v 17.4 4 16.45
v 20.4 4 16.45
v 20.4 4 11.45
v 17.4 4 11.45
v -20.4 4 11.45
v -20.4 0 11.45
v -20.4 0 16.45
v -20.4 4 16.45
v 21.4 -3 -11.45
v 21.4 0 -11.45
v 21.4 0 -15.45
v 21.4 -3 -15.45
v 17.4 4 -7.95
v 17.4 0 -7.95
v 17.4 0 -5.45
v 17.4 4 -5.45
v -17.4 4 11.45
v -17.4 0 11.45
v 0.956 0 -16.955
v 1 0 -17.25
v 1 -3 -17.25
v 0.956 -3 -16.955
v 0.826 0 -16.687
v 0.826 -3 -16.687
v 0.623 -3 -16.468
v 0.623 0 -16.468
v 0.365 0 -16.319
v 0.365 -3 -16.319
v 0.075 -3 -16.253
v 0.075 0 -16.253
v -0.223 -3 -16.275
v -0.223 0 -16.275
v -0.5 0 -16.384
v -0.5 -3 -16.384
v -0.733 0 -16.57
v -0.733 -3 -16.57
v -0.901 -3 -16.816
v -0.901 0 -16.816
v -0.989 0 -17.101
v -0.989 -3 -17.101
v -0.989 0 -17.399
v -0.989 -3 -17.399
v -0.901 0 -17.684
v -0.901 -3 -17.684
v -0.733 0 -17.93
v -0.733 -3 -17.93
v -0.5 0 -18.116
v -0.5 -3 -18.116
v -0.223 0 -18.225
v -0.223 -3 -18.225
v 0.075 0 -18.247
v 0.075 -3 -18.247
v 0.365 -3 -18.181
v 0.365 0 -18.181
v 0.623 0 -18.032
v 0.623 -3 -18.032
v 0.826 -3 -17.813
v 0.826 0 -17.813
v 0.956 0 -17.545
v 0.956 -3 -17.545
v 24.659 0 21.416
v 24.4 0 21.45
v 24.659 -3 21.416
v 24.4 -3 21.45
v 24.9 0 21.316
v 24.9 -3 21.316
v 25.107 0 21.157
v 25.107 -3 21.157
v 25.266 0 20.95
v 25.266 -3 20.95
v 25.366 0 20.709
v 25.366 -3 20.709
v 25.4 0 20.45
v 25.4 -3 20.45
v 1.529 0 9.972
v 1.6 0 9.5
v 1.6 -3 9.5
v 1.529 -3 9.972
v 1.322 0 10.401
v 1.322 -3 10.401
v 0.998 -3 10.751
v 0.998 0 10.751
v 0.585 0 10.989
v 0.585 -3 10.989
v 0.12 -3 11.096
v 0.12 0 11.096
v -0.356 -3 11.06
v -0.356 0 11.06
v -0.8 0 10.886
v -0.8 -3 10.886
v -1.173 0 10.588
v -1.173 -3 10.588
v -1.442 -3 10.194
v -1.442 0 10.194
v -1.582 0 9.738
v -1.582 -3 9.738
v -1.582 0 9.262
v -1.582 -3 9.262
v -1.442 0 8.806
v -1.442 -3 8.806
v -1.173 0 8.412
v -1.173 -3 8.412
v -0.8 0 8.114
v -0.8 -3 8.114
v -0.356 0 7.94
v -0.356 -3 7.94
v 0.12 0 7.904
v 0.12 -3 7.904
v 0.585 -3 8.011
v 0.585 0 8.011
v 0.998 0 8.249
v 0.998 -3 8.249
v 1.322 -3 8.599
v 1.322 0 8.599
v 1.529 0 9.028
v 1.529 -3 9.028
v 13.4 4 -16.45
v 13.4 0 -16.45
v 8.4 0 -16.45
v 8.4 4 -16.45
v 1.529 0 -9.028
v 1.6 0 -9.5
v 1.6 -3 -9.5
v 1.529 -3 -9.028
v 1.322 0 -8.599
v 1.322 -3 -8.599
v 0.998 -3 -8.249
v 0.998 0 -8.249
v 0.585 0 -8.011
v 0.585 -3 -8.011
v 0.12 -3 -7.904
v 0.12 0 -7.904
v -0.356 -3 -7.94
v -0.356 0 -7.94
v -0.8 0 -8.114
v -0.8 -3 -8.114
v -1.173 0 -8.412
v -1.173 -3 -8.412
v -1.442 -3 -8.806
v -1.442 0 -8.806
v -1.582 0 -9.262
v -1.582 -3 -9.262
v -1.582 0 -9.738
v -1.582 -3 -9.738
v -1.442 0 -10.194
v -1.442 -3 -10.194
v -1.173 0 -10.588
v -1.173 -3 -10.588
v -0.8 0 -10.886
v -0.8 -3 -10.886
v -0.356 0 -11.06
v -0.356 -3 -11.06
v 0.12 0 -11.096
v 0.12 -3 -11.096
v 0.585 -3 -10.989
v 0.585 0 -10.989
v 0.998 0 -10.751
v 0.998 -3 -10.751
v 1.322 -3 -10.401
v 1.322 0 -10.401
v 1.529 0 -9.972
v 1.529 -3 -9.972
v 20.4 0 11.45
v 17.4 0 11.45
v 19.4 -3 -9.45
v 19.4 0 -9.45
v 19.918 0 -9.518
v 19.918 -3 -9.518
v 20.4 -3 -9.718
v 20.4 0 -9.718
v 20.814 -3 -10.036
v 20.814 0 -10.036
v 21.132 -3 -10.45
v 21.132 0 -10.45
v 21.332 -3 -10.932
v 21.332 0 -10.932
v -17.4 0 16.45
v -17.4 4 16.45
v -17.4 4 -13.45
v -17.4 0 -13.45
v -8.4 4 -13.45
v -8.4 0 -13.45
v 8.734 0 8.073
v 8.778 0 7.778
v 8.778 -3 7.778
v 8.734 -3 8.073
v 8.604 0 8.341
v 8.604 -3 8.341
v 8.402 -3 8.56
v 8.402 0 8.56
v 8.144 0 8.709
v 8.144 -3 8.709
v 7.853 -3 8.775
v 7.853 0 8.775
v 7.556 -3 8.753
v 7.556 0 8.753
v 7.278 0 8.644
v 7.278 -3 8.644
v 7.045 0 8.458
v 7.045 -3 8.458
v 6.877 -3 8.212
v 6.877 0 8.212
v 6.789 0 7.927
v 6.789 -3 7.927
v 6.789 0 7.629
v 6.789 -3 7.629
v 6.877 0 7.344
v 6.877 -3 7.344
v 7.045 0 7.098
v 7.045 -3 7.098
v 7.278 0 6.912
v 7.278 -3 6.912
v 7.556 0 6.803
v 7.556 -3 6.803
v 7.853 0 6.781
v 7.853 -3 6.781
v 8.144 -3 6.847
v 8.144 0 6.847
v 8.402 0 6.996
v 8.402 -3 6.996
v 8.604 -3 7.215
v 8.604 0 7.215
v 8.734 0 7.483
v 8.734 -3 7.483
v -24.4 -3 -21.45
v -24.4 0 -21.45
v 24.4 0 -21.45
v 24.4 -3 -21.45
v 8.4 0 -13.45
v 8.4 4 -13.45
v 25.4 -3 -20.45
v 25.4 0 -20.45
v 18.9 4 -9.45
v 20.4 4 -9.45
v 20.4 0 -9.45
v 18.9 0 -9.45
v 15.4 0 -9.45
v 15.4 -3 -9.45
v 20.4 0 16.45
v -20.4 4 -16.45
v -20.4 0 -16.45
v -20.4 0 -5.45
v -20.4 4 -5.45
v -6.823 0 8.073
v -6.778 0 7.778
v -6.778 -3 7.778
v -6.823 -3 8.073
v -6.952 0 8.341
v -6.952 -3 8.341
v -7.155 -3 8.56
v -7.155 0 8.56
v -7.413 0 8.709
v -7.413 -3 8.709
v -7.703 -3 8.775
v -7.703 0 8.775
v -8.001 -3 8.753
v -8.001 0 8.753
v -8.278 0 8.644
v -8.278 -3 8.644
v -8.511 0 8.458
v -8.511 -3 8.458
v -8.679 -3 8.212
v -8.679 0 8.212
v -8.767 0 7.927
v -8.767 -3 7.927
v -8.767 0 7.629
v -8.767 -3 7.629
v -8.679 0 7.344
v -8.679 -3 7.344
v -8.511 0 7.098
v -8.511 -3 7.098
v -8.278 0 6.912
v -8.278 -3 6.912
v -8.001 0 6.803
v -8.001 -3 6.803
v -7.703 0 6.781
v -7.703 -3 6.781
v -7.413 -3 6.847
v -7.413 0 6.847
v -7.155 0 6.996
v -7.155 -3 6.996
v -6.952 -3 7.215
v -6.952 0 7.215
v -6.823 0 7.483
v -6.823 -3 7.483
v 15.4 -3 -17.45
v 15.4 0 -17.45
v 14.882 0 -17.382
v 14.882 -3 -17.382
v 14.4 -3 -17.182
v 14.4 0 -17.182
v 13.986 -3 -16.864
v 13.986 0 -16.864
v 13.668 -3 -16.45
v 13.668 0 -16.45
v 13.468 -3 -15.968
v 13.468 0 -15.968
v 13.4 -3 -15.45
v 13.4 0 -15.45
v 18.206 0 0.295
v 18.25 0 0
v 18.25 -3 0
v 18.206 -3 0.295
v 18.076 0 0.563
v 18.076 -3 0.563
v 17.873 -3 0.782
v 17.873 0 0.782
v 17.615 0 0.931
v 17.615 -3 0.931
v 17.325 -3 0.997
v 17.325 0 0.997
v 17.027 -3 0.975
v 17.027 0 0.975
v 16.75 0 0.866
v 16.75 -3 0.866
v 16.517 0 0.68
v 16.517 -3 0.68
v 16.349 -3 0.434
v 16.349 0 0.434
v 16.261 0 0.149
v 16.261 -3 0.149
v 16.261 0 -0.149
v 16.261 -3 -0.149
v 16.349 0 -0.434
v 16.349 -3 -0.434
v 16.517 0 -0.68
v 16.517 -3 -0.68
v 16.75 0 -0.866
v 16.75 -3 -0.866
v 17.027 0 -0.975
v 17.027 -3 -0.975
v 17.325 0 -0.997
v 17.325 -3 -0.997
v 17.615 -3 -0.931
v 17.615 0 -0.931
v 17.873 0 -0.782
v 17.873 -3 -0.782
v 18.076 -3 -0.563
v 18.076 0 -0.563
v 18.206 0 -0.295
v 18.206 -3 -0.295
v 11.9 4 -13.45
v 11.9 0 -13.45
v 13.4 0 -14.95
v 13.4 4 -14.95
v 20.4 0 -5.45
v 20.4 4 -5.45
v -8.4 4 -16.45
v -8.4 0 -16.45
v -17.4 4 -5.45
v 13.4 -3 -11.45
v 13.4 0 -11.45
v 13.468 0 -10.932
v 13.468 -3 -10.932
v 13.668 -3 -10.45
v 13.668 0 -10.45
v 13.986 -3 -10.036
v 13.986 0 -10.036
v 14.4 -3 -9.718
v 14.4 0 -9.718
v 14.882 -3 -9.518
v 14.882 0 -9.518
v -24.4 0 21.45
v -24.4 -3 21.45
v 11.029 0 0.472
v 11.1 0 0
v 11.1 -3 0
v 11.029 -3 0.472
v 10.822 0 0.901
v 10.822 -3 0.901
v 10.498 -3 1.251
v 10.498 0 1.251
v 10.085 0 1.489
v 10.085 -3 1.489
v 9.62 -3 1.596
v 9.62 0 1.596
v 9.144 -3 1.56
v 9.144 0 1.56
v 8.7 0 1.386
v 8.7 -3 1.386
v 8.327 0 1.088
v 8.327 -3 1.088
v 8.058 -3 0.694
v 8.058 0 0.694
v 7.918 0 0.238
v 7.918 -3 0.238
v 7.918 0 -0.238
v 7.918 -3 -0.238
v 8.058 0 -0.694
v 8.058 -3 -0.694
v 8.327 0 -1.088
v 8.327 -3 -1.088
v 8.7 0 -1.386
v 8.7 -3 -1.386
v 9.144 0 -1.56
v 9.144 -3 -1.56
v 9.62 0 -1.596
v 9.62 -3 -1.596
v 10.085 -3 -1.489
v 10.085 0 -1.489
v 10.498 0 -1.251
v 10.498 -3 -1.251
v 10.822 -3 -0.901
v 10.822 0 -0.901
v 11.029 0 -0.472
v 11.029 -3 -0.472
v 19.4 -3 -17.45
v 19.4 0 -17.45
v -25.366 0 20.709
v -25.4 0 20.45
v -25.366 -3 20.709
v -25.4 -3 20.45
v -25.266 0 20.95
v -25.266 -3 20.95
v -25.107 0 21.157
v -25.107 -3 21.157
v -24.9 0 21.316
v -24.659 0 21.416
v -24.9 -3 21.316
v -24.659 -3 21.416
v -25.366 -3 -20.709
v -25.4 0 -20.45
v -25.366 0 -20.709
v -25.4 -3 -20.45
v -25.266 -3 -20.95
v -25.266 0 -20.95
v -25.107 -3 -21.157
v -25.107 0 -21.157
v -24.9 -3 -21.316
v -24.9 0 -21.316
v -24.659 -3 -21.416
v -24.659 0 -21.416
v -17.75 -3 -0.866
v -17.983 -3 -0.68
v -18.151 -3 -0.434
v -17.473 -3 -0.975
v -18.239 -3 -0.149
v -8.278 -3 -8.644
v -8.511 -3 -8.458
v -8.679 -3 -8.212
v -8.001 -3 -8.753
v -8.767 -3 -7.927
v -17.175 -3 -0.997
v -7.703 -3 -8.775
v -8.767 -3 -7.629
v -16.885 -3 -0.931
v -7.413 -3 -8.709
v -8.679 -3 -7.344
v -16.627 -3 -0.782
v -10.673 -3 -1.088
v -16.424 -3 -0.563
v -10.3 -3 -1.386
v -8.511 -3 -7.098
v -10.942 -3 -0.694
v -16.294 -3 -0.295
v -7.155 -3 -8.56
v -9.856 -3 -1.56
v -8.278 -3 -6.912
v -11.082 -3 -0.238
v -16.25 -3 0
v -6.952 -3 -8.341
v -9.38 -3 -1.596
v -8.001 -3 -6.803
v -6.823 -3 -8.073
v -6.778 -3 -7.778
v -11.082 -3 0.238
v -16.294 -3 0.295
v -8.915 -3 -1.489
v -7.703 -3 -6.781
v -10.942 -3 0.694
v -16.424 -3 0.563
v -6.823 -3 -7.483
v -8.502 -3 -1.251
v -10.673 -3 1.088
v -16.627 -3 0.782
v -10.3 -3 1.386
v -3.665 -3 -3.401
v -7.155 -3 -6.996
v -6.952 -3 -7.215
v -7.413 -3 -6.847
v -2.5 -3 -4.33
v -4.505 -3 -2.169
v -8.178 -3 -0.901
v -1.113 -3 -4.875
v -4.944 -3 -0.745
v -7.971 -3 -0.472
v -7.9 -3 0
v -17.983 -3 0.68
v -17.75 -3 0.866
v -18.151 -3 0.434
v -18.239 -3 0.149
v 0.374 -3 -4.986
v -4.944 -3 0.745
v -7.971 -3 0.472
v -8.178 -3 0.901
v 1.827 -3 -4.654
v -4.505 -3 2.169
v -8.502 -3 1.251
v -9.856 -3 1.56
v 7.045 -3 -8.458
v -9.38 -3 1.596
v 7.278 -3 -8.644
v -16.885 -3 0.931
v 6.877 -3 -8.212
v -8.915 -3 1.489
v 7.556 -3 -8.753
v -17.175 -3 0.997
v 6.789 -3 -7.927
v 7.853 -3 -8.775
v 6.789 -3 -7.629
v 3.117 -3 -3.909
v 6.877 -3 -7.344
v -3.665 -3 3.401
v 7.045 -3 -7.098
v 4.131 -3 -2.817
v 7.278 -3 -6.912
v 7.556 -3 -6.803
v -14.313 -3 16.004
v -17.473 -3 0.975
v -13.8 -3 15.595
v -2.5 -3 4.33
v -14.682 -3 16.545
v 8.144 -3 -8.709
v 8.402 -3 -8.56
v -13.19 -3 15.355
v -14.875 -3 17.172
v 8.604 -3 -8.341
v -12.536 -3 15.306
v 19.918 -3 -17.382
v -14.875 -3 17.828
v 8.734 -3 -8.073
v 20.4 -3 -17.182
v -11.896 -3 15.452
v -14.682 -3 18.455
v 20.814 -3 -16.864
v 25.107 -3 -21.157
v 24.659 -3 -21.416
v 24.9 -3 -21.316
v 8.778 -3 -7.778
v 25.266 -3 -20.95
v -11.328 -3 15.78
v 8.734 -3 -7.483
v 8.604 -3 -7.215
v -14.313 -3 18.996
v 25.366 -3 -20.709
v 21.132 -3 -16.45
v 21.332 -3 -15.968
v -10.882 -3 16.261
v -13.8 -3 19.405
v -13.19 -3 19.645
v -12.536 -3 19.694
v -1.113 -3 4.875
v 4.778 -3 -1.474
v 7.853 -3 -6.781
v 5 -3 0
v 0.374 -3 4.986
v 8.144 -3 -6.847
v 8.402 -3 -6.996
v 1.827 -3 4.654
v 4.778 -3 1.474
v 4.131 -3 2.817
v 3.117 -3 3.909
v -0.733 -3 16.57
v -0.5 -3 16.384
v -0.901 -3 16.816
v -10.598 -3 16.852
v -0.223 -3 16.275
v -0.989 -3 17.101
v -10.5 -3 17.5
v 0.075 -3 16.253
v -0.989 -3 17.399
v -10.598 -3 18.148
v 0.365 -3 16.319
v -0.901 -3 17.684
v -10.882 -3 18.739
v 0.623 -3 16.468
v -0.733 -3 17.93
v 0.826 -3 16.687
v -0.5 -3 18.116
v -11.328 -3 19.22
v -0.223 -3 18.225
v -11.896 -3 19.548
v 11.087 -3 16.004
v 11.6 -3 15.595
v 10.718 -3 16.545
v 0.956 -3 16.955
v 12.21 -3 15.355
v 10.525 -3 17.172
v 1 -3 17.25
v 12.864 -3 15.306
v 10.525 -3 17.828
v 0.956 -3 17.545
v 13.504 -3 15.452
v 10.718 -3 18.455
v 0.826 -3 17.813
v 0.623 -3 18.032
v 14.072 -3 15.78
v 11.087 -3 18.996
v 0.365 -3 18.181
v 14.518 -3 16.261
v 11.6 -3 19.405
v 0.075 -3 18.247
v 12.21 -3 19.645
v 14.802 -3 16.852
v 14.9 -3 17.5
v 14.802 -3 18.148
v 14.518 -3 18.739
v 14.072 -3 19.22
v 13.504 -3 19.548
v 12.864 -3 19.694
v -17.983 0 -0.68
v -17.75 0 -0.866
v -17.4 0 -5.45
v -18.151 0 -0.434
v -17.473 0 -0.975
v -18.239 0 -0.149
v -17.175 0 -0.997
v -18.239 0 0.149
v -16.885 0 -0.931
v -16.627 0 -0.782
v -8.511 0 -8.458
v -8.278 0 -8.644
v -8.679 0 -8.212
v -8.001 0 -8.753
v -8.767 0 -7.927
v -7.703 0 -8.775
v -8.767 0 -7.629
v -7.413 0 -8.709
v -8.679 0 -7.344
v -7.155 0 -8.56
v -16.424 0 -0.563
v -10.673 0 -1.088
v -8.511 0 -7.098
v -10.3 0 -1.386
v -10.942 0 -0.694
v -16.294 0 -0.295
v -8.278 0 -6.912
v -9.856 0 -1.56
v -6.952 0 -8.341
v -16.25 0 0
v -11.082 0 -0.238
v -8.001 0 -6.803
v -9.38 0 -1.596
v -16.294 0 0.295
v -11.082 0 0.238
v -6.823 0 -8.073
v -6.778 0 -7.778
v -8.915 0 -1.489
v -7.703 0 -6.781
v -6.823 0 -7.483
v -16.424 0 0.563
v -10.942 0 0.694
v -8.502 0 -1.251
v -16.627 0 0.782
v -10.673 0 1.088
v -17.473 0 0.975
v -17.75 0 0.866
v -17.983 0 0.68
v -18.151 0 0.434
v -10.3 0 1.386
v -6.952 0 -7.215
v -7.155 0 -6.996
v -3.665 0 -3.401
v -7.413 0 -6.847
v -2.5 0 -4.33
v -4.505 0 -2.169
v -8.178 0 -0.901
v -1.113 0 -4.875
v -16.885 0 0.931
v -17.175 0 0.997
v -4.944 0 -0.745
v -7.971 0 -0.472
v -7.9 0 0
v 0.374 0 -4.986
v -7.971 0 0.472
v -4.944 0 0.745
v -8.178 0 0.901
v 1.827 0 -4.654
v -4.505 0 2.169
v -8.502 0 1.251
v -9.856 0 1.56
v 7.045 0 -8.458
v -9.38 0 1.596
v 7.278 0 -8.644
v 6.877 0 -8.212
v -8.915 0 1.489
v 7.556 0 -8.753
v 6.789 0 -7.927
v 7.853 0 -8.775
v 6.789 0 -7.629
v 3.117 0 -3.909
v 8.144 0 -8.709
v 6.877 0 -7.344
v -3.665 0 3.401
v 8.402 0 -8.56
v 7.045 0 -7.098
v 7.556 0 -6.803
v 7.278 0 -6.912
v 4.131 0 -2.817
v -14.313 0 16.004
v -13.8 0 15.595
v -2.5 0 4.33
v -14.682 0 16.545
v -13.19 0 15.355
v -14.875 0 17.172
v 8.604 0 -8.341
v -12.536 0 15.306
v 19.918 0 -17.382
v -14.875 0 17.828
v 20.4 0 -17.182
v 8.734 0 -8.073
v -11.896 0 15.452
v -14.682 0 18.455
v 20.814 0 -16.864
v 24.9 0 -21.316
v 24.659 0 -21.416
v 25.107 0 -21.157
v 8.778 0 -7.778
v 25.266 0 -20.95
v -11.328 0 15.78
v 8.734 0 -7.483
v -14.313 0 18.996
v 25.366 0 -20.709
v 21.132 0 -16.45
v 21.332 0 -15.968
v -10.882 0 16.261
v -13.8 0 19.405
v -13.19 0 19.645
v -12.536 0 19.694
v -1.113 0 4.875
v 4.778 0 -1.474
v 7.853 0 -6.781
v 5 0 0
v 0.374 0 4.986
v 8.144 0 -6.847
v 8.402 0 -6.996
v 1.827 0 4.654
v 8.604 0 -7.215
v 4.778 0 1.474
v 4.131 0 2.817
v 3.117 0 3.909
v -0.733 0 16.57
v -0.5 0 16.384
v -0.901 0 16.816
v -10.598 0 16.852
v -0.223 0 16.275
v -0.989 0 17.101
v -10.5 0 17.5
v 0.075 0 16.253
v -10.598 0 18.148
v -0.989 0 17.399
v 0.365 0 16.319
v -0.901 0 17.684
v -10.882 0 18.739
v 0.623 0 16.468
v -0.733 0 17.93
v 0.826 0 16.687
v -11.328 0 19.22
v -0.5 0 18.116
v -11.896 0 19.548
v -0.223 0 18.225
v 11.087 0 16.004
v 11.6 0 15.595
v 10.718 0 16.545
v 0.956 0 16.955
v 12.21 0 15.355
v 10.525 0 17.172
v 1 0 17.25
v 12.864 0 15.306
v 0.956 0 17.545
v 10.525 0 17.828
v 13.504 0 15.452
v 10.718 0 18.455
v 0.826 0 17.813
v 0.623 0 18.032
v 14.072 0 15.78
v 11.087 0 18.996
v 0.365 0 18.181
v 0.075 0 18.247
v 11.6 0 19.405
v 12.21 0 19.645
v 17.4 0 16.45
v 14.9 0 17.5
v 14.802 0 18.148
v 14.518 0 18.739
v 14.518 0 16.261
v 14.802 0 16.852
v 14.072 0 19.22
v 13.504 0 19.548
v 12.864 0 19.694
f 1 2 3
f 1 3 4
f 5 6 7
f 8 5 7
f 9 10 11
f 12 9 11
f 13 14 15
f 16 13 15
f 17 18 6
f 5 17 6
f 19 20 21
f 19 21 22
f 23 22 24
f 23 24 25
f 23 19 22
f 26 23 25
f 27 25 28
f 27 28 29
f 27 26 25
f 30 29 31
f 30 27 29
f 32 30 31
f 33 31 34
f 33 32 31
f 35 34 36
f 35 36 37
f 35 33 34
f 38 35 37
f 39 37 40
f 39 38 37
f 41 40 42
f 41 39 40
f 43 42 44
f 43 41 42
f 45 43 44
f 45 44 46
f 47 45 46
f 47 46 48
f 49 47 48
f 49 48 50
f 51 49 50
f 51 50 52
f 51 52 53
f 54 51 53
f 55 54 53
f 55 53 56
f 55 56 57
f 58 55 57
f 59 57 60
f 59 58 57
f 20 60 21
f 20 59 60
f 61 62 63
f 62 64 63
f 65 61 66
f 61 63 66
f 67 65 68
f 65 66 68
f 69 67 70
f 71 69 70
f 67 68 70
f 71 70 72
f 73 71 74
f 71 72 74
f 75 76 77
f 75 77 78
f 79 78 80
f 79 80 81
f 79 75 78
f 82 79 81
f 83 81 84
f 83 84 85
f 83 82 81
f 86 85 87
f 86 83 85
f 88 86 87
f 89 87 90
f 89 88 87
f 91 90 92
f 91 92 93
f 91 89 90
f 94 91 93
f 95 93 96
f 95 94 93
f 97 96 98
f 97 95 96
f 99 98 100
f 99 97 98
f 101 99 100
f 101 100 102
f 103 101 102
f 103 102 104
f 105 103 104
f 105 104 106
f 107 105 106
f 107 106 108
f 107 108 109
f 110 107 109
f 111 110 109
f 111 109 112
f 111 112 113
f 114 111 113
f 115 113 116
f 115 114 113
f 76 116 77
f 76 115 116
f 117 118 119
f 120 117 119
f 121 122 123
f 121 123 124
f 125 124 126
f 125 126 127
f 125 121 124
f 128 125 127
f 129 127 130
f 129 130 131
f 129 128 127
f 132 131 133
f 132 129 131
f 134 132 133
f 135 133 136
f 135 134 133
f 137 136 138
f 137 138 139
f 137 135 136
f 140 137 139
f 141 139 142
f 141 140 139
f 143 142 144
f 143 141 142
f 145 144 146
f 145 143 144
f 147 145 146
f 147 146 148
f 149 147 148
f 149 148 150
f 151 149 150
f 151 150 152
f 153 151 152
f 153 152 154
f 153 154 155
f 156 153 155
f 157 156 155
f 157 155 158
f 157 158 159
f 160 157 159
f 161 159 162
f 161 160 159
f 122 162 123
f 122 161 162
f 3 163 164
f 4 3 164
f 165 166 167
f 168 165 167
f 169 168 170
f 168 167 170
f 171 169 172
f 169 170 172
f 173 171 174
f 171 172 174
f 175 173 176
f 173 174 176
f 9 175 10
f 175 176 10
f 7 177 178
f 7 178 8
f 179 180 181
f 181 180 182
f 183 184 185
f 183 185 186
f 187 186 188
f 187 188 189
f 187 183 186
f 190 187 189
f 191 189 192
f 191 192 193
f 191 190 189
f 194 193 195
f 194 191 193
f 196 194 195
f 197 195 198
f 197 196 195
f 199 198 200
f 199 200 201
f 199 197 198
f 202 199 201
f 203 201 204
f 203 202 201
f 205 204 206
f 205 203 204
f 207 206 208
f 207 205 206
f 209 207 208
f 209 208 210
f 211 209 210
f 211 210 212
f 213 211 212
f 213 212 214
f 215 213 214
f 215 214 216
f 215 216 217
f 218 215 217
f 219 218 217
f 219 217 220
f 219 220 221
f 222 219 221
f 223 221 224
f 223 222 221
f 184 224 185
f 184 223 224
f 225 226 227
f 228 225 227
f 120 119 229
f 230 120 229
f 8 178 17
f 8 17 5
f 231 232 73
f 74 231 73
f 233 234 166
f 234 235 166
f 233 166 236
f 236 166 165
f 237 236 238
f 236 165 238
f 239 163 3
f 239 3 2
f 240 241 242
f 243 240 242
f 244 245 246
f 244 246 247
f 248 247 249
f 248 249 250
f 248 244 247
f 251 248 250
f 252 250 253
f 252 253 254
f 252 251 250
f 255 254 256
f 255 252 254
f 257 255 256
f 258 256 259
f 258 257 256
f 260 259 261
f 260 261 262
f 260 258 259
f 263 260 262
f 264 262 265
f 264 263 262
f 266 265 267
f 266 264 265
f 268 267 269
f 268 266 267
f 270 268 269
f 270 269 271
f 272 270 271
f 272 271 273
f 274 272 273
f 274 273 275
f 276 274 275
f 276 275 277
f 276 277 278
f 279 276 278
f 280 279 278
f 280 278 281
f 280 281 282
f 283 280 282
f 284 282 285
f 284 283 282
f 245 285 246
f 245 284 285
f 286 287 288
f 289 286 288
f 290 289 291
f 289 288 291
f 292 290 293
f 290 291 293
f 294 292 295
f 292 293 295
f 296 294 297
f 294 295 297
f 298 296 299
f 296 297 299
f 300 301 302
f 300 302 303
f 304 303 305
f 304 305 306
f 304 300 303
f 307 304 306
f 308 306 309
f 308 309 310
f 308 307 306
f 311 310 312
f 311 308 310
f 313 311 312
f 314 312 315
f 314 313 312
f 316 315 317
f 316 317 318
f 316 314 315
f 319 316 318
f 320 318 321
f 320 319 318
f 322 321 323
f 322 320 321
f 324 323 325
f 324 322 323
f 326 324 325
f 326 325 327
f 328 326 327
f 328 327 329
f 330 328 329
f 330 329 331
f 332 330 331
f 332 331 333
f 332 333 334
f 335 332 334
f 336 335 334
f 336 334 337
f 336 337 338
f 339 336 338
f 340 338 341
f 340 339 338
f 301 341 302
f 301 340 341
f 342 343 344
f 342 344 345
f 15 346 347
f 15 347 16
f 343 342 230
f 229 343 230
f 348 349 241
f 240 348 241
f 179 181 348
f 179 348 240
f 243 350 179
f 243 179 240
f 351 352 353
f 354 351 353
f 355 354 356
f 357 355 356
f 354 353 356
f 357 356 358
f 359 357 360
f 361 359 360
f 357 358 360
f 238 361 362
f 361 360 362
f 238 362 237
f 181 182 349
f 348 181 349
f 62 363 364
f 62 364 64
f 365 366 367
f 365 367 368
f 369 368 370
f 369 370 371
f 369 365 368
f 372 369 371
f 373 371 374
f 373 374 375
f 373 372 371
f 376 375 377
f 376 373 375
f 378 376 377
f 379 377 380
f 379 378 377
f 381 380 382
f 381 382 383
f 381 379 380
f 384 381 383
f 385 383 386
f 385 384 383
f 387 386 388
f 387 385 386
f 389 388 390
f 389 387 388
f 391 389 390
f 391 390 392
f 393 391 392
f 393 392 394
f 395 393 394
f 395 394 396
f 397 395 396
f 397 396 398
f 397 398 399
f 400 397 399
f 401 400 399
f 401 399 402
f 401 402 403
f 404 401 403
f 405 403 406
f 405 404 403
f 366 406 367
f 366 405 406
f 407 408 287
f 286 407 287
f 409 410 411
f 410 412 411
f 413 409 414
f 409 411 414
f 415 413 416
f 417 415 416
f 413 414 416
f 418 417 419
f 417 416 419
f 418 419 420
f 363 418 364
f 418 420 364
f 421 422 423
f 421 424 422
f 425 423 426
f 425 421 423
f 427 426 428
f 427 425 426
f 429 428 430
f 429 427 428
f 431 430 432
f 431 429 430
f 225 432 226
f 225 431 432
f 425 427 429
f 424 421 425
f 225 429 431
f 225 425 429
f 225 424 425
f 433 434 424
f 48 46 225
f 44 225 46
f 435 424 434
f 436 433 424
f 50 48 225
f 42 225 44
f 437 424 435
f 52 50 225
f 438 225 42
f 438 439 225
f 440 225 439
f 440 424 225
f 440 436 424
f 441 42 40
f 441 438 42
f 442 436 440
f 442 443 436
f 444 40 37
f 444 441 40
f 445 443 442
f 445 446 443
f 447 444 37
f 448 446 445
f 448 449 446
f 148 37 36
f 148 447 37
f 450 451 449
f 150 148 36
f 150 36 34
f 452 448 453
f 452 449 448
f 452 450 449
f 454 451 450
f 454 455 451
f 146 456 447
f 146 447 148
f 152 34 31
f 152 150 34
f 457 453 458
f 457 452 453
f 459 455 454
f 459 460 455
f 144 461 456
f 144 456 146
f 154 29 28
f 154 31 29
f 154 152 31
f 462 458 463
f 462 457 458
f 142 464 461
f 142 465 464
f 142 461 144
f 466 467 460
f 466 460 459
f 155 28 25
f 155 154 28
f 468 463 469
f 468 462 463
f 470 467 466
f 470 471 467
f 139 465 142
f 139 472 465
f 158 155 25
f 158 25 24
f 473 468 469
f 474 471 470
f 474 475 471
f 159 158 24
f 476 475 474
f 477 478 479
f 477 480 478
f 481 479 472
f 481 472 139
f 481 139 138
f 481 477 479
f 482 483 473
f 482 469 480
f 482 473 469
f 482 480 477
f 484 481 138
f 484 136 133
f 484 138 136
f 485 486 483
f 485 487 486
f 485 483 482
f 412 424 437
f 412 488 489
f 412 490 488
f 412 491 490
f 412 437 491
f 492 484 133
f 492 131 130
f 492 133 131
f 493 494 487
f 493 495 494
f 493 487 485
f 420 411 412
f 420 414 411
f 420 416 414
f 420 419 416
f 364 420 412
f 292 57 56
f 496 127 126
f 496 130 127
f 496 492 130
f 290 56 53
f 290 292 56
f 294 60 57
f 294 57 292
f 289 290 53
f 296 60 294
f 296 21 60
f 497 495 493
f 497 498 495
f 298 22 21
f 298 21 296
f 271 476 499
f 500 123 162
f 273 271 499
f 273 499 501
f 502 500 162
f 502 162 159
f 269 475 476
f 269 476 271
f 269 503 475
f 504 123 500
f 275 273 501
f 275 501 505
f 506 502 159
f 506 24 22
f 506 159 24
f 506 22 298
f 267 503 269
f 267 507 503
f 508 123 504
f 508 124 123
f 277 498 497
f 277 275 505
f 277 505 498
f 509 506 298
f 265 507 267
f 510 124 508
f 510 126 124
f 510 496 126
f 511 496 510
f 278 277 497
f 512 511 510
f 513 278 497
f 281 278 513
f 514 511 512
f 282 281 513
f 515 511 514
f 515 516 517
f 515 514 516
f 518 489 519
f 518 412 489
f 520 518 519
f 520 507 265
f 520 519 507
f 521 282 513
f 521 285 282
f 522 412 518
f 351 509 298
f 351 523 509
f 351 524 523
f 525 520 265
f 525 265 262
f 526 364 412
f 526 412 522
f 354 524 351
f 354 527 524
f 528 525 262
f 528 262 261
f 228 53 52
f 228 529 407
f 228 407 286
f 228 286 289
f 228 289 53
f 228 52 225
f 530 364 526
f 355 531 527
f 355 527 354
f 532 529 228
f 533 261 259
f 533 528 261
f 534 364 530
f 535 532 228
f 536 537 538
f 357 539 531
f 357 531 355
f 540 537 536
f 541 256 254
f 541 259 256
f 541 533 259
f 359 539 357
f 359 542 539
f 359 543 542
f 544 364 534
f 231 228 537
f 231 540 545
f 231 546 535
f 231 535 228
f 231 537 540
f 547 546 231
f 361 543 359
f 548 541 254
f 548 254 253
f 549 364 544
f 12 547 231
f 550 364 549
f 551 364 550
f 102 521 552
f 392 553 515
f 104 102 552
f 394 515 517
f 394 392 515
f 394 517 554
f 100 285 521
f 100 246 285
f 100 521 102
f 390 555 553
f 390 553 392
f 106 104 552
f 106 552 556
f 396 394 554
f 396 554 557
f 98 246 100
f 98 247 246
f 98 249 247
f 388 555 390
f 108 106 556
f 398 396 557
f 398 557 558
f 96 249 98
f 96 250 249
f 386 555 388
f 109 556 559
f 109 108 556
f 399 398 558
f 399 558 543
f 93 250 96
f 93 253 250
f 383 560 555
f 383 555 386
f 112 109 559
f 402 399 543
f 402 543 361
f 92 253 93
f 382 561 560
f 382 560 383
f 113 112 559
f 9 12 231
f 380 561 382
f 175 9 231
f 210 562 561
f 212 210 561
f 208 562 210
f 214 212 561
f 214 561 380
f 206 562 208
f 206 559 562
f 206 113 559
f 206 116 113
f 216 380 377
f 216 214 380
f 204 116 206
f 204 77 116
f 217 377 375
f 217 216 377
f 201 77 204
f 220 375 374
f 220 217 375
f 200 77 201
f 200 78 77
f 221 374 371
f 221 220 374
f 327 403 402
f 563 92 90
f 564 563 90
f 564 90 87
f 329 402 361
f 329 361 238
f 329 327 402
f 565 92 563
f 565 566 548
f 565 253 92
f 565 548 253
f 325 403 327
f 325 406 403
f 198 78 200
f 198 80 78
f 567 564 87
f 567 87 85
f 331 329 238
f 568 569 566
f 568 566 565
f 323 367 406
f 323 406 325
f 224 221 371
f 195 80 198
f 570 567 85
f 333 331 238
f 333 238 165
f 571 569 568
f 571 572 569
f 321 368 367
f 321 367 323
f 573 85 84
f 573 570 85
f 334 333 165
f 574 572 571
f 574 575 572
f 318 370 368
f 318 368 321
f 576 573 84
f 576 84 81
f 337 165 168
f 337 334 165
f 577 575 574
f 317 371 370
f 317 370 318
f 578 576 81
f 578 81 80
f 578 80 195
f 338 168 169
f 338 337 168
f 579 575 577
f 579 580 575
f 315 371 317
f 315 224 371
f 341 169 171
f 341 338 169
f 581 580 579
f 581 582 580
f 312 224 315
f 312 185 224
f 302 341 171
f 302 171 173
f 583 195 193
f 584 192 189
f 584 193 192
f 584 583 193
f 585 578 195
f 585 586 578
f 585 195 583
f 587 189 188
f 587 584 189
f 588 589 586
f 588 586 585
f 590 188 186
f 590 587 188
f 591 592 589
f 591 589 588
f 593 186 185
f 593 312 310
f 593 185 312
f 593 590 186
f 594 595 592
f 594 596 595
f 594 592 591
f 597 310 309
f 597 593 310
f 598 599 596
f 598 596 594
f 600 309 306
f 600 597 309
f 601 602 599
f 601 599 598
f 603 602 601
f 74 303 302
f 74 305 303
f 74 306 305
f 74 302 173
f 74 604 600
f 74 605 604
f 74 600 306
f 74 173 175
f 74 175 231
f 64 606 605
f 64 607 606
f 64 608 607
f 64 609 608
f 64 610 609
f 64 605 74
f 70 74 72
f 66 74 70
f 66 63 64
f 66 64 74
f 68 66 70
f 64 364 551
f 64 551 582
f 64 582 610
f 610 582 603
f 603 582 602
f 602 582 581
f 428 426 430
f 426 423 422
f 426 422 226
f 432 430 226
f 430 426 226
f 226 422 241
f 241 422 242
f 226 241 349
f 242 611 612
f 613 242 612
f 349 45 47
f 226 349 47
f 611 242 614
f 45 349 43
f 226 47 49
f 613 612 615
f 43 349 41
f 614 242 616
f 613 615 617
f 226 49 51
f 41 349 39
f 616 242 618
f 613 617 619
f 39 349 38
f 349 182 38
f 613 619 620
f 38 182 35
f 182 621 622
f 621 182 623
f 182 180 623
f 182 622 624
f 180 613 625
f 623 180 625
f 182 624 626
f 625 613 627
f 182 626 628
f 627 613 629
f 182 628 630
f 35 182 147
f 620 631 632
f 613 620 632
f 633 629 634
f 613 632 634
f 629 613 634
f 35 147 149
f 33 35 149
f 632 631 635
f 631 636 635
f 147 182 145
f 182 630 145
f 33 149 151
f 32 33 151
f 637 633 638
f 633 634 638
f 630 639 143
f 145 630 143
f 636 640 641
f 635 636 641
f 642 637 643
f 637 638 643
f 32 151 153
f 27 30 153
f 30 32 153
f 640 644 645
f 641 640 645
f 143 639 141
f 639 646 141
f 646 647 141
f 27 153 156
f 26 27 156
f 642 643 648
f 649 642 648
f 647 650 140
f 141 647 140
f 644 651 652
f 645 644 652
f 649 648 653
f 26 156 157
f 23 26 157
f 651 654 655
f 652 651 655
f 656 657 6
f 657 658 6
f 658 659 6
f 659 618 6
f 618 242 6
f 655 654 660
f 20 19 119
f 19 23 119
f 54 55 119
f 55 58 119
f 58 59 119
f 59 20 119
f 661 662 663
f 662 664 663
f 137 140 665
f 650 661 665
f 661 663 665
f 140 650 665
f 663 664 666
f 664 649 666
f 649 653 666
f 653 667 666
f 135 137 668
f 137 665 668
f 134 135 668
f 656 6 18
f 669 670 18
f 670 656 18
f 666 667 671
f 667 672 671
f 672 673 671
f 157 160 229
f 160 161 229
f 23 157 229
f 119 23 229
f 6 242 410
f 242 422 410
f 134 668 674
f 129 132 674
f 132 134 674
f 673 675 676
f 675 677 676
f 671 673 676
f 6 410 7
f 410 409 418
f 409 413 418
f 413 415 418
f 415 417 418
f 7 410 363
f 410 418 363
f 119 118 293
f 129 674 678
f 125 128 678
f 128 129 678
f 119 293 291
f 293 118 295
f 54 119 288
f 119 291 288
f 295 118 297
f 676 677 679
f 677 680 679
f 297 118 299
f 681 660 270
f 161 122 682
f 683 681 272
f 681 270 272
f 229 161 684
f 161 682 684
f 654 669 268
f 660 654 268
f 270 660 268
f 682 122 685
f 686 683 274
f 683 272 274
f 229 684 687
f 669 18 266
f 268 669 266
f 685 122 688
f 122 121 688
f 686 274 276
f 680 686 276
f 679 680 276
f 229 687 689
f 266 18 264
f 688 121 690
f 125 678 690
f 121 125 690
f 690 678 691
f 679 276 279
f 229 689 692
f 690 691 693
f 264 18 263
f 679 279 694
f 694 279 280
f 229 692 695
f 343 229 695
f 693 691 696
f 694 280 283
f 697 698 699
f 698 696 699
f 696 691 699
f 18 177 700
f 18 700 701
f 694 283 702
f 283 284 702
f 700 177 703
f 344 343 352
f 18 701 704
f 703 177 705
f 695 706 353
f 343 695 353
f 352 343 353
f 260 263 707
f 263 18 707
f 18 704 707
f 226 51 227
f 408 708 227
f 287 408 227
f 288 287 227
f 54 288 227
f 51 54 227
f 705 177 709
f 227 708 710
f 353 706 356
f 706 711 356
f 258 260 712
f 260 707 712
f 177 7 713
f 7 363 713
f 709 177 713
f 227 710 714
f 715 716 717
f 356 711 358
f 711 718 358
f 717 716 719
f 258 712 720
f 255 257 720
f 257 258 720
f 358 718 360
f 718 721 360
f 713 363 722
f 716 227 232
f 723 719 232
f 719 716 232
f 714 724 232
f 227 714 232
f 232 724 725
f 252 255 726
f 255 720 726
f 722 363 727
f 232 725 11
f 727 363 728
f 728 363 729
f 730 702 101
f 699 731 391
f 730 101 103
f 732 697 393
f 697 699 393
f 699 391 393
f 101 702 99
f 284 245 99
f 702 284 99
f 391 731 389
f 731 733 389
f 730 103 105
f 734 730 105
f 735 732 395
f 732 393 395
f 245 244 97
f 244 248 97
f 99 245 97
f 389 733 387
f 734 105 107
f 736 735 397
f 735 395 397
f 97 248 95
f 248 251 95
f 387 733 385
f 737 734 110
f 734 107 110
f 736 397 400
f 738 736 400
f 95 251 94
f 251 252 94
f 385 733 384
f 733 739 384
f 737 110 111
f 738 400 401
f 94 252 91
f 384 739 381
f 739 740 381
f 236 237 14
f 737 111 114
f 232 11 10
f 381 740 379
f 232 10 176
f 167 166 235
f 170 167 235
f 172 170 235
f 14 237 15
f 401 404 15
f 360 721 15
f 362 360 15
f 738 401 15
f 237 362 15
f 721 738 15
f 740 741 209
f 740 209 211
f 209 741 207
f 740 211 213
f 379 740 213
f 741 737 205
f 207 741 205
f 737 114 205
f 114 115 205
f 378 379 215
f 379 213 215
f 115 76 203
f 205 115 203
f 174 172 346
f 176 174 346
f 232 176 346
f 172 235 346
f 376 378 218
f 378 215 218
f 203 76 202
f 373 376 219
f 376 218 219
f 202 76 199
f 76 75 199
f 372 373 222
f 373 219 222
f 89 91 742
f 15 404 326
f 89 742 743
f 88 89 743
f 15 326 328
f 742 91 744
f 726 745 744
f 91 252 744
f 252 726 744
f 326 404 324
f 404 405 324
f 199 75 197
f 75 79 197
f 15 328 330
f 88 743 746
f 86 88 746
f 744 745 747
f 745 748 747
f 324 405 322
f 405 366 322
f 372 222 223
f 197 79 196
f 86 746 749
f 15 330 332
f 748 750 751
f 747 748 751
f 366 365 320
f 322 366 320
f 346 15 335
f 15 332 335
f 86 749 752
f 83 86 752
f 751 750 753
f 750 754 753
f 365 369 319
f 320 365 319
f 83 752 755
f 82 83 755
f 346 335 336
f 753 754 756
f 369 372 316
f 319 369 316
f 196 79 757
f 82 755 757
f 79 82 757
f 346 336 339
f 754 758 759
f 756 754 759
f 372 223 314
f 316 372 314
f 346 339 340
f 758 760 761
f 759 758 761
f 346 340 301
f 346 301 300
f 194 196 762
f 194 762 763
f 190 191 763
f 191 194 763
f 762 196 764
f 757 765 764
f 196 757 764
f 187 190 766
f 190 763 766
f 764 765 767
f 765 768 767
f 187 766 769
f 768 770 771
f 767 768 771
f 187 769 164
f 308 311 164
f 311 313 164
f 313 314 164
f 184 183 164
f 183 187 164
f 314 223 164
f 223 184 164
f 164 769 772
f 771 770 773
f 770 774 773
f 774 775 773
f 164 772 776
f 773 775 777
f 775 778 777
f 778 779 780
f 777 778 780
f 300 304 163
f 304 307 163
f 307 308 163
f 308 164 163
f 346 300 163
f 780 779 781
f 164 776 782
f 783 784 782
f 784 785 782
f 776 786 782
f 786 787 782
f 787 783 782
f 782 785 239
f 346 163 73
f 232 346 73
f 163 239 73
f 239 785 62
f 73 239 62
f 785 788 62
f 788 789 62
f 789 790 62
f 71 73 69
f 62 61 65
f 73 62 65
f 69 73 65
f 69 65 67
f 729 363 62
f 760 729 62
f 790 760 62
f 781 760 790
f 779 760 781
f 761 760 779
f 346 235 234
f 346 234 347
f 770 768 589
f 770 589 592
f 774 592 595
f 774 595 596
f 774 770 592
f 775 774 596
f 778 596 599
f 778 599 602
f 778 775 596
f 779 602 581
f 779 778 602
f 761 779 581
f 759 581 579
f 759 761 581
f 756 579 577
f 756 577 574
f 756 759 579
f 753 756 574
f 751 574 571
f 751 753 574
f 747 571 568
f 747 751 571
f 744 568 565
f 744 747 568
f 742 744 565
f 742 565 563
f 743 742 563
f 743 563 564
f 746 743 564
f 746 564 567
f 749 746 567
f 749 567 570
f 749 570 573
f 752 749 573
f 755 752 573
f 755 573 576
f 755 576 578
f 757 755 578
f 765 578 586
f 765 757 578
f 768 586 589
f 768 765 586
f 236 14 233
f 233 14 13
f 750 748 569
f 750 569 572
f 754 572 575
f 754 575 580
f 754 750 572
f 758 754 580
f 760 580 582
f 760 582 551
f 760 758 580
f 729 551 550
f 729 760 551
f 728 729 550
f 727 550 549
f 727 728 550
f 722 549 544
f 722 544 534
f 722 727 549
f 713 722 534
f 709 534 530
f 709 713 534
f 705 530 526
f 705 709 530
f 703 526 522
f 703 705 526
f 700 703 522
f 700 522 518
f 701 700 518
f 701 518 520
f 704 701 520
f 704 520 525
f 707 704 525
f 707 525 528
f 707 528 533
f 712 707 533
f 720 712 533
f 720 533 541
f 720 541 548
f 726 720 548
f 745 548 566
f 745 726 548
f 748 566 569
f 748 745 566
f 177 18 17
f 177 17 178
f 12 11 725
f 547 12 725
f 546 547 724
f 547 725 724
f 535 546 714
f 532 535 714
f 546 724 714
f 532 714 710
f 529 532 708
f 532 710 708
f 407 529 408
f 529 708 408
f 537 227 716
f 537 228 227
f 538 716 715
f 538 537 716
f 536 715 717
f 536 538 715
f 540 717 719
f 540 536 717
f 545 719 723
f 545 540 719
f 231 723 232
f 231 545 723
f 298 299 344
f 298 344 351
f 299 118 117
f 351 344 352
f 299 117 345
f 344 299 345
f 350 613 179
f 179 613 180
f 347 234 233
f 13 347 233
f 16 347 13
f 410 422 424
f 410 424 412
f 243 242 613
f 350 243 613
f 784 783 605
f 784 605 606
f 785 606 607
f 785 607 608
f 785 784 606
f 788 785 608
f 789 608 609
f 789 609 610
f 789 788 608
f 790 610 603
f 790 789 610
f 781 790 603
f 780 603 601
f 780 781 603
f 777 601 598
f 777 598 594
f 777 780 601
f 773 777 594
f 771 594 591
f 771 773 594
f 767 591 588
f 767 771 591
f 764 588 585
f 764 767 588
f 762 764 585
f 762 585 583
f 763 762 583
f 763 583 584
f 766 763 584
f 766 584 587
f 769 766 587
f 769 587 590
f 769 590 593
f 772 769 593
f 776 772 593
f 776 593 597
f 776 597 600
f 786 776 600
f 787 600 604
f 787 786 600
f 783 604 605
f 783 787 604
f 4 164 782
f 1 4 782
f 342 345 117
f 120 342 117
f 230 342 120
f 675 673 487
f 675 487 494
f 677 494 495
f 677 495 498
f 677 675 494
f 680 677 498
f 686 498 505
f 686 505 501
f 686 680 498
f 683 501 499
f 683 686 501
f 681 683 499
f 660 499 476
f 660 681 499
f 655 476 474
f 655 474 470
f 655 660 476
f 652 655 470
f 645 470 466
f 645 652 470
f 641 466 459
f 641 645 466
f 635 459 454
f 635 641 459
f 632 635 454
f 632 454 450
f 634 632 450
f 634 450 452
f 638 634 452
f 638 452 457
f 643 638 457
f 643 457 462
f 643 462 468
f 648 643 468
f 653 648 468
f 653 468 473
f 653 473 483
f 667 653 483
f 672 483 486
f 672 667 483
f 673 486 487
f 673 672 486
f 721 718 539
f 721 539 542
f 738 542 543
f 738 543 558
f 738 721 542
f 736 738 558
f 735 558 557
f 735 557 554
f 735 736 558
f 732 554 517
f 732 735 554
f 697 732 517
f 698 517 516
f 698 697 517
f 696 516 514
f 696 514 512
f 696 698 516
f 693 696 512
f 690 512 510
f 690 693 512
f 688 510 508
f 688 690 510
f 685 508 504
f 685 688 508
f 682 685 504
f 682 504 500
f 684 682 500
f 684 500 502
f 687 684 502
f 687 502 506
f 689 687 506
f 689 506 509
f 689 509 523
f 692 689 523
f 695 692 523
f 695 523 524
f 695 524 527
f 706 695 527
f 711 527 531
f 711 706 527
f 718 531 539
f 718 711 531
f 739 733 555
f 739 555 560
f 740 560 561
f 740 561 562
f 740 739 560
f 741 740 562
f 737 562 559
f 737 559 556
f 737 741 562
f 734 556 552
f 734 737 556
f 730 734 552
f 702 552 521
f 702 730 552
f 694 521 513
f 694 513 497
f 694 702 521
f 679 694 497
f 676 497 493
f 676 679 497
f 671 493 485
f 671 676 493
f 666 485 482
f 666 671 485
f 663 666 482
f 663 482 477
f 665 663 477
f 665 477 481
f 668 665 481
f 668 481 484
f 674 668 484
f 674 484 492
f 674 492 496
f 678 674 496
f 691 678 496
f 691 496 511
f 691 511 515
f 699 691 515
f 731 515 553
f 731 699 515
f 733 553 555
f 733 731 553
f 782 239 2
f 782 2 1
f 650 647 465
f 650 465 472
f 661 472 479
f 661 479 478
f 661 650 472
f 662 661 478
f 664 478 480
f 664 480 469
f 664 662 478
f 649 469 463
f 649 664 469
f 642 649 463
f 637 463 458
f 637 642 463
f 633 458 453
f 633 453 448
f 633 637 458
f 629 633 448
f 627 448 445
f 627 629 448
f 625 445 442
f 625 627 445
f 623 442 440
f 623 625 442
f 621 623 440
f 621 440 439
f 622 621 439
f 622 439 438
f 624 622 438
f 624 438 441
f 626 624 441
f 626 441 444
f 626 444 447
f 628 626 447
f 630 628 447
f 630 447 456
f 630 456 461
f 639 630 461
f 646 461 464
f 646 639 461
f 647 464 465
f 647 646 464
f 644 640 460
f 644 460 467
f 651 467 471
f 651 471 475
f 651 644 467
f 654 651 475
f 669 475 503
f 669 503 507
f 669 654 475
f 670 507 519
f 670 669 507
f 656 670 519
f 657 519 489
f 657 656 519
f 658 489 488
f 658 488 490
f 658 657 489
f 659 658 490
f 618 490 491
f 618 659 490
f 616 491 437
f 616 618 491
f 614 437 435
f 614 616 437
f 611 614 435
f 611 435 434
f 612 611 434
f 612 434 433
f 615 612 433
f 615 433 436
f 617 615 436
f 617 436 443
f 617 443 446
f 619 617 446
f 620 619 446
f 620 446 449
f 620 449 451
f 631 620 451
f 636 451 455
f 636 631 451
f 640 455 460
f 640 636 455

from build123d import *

# Parameters (mm, degrees)
F0_W     = 50.8
F0_H     = 42.9
F0_R     = 1
F0_R_2   = 1.6
F0_R_3   = 5
F0_R_4   = 2.2
F1_DEPTH = 3
F2_R     = 1
F3_W     = 3
F3_H     = 5
F3_H_2   = 4
F3_W_2   = 5
F3_H_3   = 3
F4_DEPTH = 4
F5_SIZE  = 1.5


with BuildPart() as f1:
    # F0 (on Front) → F1 (new body)
    with BuildSketch(Plane.XZ):
        Rectangle(F0_W, F0_H)
        with Locations((0, -17.25)):
            Circle(F0_R, mode=Mode.SUBTRACT)
        with Locations((-7.7781745931, -7.7781745931)):
            Circle(F0_R, mode=Mode.SUBTRACT)
        with Locations((0, -9.5)):
            Circle(F0_R_2, mode=Mode.SUBTRACT)
        with BuildLine():
            ThreePointArc((21.4, -15.45), (20.8142135624, -16.8642135624), (19.4, -17.45))
            Line((19.4, -17.45), (15.4, -17.45))
            ThreePointArc((15.4, -17.45), (13.9857864376, -16.8642135624), (13.4, -15.45))
            Line((13.4, -15.45), (13.4, -11.45))
            ThreePointArc((13.4, -11.45), (13.9857864376, -10.0357864376), (15.4, -9.45))
            Line((15.4, -9.45), (19.4, -9.45))
            ThreePointArc((19.4, -9.45), (20.8142135624, -10.0357864376), (21.4, -11.45))
            Line((21.4, -11.45), (21.4, -15.45))
        make_face(mode=Mode.SUBTRACT)
        with Locations((7.7781745931, -7.7781745931)):
            Circle(F0_R, mode=Mode.SUBTRACT)
        with Locations((-17.25, 0)):
            Circle(F0_R, mode=Mode.SUBTRACT)
        with Locations((-9.5, 0)):
            Circle(F0_R_2, mode=Mode.SUBTRACT)
        Circle(F0_R_3, mode=Mode.SUBTRACT)
        with Locations((-7.7781745931, 7.7781745931)):
            Circle(F0_R, mode=Mode.SUBTRACT)
        with Locations((0, 9.5)):
            Circle(F0_R_2, mode=Mode.SUBTRACT)
        with Locations((-12.7, 17.5)):
            Circle(F0_R_4, mode=Mode.SUBTRACT)
        with Locations((0, 17.25)):
            Circle(F0_R, mode=Mode.SUBTRACT)
        with Locations((9.5, 0)):
            Circle(F0_R_2, mode=Mode.SUBTRACT)
        with Locations((7.7781745931, 7.7781745931)):
            Circle(F0_R, mode=Mode.SUBTRACT)
        with Locations((17.25, 0)):
            Circle(F0_R, mode=Mode.SUBTRACT)
        with Locations((12.7, 17.5)):
            Circle(F0_R_4, mode=Mode.SUBTRACT)
    extrude(amount=F1_DEPTH)

    # F2
    f2_edges = [f1.edges().sort_by_distance(p)[0] for p in [
        (25.4, -1.5, 21.45),
        (25.4, -1.5, -21.45),
        (-25.4, -1.5, -21.45),
        (-25.4, -1.5, 21.45),
    ]]
    fillet(f2_edges, radius=F2_R)

    # F3 (on face) → F4 (join)
    with BuildSketch(Plane(origin=(0, 0, 0), x_dir=(-1, 0, 0), z_dir=(0, 1, 0))):
        with Locations((-18.9, 13.95)):
            Rectangle(F3_W, F3_H)
        with Locations((-18.9, -7.45)):
            Rectangle(F3_W, F3_H_2)
        with Locations((18.9, 13.95)):
            Rectangle(F3_W, F3_H)
        Polygon((20.4, -16.45), (20.4, -5.45), (17.4, -5.45), (17.4, -13.45), (8.4, -13.45), (8.4, -16.45), align=None)
        with Locations((-10.9, -14.95)):
            Rectangle(F3_W_2, F3_H_3)
    extrude(amount=F4_DEPTH)

    # F5
    f5_edges = [f1.edges().sort_by_distance(p)[0] for p in [
        (13.4, 2, -13.45),
        (17.4, 2, -9.45),
    ]]
    chamfer(f5_edges, length=F5_SIZE)


solid = f1.part
